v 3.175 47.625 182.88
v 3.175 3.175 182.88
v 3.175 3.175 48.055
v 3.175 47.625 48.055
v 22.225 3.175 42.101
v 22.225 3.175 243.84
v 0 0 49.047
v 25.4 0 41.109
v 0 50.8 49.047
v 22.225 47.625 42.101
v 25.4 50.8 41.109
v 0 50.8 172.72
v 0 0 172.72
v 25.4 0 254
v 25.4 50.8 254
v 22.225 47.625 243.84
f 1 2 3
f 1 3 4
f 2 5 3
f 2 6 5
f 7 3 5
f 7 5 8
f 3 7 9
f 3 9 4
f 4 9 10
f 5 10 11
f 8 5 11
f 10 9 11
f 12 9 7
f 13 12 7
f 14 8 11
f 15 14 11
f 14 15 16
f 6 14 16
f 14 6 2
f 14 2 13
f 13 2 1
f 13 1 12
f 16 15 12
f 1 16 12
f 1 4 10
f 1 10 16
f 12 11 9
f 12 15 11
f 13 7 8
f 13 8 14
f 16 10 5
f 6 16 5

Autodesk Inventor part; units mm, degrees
ref_plane "YZ Plane" through (0, 0, 0) normal (1, 0, 0) x (0, 1, 0)
ref_plane "XZ Plane" through (0, 0, 0) normal (0, 1, 0) x (-1, 0, 0)
ref_plane "XY Plane" through (0, 0, 0) normal (0, 0, 1) x (1, 0, 0)
sketch "Sketch1" plane through (0, 0, 0) normal (0, 0, 1) x (1, 0, 0)
  line L0 (0, 0) -> (25.4, 0)
  line L1 (25.4, 0) -> (25.4, 50.8)
  line L2 (25.4, 50.8) -> (0, 50.8)
  line L3 (0, 50.8) -> (0, 0)
  line L4 (22.225, 47.625) -> (22.225, 3.175)
  line L5 (22.225, 3.175) -> (3.175, 3.175)
  line L6 (3.175, 3.175) -> (3.175, 47.625)
  line L7 (3.175, 47.625) -> (22.225, 47.625)
  dimension "d0" = 25.4
  dimension "d1" = 50.8
  dimension "d2" = 3.175
extrude "Extrusion1" add sketch "Sketch1" along normal blind 254
sketch "Sketch4" plane through (0, 50.8, 0) normal (0, 1, 0) x (1, 0, 0)
  line L0 (0, -254) -> (25.4, -254) projected
  line L1 (25.4, 0) -> (25.4, -254) projected
  line L2 (25.4, 0) -> (0, 0) projected
  line L3 (0, 0) -> (0, -254) projected
  line L4 (25.4, -254) -> (-35.2095, -60.0497)
  line L5 (-35.2095, -60.0497) -> (25.4, -41.1092)
  line L6 (25.4, -254) -> (25.4, -41.1092)
  line L7 (0, -49.0467) -> (0, -172.72)
  dimension "d17" = 203.2
  dimension "d18" = 63.5
extrude "Extrusion4" cut sketch "Sketch4" against normal blind 254 contours L3 L4 L0 | L5 L3 L2 L1
properties part number "ball shoot" material "Aluminum 6061"
